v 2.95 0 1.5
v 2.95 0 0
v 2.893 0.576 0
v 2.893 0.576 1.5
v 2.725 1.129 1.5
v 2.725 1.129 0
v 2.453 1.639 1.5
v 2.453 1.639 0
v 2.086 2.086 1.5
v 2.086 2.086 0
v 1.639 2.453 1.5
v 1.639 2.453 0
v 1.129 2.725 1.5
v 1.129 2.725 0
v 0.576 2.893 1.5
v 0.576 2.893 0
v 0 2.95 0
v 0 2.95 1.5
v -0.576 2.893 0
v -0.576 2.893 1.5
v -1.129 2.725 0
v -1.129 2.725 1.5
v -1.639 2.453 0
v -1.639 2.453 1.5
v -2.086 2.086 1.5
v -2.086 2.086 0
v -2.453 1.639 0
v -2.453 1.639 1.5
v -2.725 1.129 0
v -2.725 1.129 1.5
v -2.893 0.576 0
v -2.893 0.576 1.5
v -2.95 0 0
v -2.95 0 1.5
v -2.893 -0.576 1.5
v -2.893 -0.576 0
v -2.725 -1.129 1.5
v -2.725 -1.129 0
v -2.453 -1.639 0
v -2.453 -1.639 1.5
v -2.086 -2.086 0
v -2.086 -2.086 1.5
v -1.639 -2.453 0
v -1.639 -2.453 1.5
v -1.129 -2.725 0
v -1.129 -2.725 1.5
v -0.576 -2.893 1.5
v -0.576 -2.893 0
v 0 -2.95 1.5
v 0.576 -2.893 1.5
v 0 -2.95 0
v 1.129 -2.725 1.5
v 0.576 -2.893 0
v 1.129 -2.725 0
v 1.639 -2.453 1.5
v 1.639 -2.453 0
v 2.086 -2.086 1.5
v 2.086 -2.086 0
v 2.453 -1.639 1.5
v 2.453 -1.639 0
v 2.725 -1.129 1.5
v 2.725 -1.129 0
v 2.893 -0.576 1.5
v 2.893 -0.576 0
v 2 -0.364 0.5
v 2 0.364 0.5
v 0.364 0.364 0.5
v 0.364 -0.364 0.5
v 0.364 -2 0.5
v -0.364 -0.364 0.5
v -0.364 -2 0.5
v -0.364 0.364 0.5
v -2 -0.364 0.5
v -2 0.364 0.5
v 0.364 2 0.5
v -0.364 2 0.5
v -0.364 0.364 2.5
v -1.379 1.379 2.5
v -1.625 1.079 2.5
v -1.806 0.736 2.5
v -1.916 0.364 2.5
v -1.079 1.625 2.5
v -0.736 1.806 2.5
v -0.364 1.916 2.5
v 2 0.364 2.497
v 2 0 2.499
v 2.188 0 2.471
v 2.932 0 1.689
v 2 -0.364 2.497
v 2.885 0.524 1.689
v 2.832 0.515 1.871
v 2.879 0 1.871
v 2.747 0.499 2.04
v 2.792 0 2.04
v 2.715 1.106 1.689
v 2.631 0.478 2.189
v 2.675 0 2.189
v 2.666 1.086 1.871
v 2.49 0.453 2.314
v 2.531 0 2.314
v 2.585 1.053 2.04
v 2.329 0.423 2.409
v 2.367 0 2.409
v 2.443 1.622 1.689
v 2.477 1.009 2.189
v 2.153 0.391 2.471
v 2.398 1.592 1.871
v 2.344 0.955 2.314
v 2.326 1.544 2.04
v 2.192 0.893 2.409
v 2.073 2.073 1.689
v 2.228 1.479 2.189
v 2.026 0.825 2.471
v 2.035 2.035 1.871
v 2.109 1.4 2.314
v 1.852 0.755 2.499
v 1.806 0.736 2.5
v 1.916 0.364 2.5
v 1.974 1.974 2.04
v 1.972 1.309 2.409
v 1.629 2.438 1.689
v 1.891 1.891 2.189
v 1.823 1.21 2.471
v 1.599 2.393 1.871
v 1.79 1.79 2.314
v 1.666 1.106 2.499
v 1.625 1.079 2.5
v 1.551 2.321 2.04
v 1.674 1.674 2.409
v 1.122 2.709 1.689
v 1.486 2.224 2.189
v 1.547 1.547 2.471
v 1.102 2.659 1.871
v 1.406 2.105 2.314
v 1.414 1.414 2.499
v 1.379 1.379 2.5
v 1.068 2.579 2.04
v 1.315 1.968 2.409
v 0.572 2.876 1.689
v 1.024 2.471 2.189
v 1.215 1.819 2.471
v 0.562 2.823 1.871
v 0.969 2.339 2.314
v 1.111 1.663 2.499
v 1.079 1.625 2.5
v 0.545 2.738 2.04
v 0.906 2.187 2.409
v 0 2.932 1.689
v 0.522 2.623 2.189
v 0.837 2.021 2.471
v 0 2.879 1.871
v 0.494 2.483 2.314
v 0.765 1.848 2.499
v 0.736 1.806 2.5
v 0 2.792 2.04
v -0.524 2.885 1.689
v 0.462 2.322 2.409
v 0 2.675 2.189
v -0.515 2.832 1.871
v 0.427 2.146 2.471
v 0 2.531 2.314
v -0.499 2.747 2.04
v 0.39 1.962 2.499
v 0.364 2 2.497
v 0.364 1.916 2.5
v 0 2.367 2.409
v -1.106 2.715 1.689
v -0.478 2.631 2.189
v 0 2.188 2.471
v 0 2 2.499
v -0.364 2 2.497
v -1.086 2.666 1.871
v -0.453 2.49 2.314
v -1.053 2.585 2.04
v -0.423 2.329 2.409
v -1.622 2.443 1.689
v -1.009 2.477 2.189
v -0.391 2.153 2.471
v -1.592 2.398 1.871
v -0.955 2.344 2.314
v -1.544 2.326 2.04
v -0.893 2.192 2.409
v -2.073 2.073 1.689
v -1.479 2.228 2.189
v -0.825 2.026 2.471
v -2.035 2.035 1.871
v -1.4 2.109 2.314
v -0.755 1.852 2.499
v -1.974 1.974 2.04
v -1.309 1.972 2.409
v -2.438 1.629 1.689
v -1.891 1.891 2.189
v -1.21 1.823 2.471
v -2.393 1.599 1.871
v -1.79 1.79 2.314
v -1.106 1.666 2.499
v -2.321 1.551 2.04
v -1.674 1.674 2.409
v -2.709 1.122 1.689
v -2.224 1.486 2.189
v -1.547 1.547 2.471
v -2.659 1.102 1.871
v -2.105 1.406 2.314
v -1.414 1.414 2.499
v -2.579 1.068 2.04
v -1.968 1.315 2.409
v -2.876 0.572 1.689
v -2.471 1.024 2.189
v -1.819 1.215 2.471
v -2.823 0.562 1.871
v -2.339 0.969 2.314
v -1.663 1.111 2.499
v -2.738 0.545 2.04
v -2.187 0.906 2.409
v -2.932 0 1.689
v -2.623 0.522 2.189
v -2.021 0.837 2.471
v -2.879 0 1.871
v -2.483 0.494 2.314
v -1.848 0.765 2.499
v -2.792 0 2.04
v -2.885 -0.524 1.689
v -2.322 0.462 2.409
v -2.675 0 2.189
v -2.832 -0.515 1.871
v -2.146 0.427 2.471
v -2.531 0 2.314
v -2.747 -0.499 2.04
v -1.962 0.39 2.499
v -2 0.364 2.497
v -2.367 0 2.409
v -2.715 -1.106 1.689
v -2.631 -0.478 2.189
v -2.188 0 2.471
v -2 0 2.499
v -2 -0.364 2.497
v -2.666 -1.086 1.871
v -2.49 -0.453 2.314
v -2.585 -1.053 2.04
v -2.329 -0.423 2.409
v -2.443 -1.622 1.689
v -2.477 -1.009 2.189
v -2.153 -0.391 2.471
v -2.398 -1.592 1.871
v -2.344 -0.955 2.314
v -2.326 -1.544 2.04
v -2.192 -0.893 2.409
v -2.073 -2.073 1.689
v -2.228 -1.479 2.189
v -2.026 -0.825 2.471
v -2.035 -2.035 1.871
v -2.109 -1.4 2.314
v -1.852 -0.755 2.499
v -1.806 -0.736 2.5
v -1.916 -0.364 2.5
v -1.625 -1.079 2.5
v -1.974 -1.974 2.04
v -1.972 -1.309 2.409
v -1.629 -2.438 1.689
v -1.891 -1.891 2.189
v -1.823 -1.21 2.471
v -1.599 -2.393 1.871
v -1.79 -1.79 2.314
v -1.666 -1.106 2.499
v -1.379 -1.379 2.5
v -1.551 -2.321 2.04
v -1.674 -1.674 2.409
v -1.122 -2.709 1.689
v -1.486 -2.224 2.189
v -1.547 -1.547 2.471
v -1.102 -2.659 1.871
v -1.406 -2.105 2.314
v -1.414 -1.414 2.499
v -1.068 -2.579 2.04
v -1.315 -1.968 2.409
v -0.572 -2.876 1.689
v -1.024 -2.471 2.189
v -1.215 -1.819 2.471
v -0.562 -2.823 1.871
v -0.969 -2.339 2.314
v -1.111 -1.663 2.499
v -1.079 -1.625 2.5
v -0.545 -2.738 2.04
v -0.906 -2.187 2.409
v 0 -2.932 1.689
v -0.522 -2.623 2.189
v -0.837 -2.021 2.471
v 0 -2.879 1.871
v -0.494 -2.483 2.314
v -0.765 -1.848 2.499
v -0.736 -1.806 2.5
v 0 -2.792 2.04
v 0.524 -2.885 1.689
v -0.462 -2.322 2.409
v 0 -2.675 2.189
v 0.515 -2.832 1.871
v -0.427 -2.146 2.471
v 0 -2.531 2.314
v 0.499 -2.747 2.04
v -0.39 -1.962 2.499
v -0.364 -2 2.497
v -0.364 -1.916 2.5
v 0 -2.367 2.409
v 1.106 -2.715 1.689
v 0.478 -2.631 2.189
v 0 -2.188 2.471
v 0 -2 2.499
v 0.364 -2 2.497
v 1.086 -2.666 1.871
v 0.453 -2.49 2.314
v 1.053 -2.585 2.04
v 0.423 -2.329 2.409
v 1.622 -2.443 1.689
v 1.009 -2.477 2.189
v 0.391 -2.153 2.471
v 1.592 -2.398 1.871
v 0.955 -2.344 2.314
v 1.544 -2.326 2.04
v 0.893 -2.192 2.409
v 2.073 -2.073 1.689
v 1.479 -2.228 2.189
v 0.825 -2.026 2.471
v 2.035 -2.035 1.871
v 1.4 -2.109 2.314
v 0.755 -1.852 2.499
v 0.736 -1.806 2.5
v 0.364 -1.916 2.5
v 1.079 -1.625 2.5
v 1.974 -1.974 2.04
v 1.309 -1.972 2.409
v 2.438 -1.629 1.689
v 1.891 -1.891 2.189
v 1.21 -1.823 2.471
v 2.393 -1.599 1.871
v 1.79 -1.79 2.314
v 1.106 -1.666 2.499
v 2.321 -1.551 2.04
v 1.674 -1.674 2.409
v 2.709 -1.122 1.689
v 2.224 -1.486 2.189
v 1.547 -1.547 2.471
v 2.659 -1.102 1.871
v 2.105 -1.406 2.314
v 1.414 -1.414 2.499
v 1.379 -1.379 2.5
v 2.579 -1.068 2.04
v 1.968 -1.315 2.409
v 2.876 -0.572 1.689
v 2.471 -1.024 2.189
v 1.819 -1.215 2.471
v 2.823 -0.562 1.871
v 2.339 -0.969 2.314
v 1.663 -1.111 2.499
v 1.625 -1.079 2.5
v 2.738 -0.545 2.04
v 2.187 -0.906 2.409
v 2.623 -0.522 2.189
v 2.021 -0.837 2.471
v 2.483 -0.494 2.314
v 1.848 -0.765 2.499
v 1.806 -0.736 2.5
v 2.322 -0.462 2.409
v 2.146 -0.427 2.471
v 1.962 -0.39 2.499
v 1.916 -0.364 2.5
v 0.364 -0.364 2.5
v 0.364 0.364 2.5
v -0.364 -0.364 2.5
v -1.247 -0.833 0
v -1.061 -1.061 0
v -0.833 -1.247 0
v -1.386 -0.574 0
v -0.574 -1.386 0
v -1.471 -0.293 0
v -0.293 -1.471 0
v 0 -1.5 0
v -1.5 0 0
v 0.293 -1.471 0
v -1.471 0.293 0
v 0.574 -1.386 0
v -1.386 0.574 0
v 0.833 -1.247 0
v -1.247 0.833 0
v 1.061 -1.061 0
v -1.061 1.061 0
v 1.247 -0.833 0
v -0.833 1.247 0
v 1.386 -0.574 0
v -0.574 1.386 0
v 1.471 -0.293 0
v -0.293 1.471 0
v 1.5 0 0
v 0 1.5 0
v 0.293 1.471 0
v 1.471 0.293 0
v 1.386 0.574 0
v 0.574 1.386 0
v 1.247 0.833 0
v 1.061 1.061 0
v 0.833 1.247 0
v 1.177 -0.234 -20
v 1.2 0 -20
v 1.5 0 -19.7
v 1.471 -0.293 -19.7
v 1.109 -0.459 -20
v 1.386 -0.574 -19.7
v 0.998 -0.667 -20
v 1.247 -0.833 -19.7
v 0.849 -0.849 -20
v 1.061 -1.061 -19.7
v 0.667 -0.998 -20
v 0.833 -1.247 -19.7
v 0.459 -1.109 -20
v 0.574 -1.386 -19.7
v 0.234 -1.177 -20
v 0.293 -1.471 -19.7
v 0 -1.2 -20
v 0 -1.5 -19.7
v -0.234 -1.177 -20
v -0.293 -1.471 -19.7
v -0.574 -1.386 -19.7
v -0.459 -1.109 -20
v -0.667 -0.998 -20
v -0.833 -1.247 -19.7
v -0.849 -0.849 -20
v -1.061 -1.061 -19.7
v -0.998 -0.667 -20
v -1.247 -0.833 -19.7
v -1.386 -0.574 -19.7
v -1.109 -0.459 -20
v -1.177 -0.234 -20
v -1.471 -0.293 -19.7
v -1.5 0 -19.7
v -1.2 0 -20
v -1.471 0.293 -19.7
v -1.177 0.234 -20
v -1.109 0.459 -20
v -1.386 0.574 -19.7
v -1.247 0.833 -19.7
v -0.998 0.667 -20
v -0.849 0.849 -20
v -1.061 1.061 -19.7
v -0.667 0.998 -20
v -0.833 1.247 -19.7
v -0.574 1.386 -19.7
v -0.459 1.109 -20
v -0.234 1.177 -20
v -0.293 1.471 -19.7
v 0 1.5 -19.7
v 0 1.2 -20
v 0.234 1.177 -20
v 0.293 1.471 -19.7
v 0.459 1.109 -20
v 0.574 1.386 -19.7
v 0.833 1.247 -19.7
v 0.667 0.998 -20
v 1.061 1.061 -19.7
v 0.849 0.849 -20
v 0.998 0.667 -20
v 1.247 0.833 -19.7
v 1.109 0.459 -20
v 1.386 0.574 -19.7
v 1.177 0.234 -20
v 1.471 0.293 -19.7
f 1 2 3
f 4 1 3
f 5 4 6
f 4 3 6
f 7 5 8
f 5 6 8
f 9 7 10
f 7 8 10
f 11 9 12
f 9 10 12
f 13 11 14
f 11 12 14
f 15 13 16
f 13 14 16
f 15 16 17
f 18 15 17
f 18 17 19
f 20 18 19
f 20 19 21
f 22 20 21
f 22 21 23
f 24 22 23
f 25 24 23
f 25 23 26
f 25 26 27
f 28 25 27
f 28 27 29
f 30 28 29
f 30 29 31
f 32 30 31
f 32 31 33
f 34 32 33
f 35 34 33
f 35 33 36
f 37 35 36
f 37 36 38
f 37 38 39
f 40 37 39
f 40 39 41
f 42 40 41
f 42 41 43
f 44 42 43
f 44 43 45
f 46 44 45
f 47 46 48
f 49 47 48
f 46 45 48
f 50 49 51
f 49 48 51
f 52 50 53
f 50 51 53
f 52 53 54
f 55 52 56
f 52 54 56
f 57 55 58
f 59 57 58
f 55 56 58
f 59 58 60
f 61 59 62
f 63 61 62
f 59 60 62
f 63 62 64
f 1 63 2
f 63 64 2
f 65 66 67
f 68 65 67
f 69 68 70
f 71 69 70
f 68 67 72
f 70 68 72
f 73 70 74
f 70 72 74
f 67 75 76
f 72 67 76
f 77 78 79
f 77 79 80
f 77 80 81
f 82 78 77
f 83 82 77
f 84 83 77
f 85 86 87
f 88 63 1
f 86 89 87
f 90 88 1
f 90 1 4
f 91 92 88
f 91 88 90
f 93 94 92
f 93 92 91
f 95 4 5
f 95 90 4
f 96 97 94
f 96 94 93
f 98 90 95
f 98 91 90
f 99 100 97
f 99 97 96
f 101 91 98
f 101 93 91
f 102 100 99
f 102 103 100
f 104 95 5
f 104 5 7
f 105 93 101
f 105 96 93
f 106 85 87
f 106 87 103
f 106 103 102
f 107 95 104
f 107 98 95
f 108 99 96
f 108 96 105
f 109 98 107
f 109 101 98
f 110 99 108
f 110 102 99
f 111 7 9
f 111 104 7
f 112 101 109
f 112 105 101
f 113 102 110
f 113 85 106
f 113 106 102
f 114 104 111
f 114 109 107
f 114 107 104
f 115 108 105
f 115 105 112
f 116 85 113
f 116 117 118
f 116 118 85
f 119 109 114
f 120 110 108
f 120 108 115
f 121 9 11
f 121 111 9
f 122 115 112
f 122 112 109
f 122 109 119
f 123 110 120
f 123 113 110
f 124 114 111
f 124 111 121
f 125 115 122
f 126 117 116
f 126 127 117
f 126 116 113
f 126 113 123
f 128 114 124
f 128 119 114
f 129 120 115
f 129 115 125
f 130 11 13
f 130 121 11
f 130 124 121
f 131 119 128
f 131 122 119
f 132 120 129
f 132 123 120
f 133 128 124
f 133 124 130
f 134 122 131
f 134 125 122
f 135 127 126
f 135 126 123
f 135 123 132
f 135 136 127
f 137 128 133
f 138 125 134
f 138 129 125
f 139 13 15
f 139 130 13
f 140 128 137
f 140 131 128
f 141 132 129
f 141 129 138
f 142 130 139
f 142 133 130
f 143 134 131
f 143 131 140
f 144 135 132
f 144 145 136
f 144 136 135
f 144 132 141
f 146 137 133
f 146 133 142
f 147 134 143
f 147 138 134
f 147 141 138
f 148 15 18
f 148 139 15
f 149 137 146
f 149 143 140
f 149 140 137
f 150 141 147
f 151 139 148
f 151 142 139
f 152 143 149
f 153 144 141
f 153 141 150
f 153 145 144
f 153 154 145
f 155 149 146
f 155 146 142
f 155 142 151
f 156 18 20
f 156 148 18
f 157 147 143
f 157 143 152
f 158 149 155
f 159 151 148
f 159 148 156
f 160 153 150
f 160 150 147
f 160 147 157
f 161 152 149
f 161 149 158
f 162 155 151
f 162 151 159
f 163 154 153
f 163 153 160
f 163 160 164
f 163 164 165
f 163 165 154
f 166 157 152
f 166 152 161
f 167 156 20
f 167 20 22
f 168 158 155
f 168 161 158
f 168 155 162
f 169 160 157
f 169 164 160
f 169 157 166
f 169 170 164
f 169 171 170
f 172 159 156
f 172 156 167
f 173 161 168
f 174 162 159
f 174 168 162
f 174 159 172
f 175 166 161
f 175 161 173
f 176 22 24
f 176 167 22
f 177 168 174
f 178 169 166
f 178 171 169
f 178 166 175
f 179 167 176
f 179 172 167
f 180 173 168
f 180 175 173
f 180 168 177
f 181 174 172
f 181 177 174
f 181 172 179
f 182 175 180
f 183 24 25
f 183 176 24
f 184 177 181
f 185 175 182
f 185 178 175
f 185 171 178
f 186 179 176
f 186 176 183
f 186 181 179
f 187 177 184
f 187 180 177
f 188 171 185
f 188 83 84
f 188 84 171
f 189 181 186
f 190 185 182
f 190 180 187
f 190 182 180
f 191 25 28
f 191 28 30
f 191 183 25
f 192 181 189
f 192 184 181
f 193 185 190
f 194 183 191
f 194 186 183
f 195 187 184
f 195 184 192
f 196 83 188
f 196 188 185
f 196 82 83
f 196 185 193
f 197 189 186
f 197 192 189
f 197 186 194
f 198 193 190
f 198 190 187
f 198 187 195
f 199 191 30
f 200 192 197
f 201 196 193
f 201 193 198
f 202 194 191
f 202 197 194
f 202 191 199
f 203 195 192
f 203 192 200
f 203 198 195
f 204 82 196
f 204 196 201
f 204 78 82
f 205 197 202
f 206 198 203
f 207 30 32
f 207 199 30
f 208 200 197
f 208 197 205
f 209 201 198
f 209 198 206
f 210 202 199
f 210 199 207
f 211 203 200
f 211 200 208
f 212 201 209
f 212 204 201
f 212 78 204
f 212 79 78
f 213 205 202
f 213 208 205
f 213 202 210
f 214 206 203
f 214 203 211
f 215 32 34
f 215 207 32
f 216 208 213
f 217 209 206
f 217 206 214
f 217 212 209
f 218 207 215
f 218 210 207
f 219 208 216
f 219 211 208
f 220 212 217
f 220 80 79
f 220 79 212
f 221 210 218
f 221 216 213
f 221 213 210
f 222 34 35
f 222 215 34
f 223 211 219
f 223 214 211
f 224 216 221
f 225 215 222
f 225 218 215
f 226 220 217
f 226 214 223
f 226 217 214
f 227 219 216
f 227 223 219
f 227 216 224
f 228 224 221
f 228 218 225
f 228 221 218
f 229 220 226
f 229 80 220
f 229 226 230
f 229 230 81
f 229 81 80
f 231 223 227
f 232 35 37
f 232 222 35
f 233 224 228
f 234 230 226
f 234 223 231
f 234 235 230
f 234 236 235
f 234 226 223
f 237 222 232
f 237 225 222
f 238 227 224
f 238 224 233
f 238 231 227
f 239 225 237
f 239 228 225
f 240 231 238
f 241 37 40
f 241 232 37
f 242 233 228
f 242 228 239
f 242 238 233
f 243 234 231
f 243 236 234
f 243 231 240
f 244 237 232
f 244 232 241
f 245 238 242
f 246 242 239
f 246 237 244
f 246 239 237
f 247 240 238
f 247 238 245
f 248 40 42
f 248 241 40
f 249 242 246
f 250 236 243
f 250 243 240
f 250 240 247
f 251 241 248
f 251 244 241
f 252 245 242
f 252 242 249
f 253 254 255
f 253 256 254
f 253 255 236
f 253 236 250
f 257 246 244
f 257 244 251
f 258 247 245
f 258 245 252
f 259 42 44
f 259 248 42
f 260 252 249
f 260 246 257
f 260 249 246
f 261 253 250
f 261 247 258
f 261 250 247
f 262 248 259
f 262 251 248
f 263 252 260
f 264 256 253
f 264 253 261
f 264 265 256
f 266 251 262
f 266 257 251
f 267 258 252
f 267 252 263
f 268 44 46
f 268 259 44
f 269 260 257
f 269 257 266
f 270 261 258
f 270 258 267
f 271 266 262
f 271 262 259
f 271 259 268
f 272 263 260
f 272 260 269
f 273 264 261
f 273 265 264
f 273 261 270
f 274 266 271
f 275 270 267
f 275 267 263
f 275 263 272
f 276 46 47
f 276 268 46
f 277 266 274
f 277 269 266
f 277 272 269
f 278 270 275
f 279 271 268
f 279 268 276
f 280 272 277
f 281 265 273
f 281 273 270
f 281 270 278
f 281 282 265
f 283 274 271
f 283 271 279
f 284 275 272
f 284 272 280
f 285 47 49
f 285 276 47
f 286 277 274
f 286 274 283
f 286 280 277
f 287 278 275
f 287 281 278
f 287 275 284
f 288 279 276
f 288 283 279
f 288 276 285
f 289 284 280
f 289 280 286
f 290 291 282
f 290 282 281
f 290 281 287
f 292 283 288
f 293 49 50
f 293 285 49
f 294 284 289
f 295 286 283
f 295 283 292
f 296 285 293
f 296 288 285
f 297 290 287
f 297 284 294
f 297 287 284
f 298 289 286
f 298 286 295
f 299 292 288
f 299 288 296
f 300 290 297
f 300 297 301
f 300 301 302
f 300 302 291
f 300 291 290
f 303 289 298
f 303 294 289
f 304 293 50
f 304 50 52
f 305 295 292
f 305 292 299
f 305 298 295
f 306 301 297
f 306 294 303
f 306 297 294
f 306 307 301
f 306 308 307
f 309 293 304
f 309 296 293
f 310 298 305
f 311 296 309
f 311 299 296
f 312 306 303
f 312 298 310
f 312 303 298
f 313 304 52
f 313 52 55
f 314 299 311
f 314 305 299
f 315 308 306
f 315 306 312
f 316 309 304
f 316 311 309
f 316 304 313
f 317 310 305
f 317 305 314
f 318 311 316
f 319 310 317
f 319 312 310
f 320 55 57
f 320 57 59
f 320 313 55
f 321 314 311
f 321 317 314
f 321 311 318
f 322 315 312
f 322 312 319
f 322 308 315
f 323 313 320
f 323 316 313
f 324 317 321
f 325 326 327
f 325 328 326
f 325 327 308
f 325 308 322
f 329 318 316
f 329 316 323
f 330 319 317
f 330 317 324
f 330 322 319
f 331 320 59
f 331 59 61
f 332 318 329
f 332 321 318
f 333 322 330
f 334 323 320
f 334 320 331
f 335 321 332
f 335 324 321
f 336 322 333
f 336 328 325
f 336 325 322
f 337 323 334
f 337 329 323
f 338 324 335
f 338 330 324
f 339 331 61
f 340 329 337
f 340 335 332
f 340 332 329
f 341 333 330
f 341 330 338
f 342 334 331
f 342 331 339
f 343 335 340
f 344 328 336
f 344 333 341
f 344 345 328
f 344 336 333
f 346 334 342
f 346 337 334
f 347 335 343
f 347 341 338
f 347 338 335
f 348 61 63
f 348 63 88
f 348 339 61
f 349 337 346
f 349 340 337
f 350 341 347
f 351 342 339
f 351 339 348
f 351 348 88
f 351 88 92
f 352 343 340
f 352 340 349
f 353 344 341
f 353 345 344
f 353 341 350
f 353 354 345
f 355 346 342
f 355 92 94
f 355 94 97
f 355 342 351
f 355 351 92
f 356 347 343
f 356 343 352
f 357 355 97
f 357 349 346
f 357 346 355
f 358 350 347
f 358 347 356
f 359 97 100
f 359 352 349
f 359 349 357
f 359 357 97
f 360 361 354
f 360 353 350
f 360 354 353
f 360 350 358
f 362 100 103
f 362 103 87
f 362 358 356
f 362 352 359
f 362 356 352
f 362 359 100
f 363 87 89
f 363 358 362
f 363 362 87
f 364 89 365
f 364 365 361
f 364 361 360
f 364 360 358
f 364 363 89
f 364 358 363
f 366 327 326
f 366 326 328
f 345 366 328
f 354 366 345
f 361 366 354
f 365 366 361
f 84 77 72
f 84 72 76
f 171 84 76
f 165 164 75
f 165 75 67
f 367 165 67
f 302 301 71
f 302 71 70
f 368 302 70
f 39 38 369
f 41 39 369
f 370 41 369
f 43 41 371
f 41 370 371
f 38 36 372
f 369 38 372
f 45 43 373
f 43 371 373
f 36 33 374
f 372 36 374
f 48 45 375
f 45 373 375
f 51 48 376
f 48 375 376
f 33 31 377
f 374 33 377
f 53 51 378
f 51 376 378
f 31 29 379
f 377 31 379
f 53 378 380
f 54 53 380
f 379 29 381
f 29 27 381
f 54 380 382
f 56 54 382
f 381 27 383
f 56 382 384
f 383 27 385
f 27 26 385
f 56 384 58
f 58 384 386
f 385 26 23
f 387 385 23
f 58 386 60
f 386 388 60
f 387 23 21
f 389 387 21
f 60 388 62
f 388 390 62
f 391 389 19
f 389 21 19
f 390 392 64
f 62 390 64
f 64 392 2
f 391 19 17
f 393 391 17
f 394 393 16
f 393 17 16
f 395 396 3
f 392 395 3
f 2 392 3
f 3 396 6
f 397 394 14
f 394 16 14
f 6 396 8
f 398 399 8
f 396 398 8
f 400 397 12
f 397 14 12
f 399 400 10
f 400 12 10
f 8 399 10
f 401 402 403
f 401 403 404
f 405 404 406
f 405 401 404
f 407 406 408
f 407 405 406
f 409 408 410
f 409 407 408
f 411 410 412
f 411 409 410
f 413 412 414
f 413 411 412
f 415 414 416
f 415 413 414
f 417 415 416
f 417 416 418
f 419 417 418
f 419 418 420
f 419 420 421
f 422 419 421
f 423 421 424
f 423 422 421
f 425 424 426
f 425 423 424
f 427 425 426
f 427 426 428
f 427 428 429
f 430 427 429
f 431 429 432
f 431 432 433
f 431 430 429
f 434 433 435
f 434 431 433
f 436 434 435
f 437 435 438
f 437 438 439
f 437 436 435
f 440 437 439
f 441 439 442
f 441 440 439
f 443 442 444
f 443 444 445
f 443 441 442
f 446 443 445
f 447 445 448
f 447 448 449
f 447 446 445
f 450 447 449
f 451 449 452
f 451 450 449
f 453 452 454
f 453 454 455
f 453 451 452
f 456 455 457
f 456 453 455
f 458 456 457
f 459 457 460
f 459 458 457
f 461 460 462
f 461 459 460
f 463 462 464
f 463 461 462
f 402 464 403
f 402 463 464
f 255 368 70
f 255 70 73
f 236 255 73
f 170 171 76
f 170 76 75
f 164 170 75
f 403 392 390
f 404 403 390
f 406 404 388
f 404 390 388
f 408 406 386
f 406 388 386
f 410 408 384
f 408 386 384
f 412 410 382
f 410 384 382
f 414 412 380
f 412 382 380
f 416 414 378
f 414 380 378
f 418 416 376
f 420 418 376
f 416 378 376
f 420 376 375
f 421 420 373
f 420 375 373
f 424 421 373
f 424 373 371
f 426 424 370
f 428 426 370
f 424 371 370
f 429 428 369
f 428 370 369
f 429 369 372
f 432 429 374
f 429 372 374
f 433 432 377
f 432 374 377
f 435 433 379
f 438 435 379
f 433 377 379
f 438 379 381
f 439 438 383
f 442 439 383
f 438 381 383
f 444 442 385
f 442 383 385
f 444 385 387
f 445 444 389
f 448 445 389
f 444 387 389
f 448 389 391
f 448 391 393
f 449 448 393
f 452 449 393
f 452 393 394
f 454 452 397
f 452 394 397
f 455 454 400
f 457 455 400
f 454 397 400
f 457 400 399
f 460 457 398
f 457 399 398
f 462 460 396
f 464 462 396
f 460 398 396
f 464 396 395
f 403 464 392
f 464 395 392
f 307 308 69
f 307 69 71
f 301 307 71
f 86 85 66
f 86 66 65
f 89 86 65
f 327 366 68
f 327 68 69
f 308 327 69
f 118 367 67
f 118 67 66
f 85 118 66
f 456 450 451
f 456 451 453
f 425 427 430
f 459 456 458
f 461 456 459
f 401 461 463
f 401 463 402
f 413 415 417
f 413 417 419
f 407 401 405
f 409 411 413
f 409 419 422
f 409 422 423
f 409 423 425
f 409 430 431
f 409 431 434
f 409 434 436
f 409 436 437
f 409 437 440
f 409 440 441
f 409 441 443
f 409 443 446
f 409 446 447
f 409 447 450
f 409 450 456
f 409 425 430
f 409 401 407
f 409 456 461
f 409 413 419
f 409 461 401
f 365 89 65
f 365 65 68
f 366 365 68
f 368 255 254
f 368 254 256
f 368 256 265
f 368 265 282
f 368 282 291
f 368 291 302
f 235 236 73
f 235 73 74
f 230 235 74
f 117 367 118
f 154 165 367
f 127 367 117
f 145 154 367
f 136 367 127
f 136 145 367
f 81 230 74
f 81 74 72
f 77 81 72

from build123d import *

# Parameters (mm, degrees)
SKETCH1_R           = 2.95
BOSS_EXTRUDE1_DEPTH = 2.5
SKETCH2_R           = 1.5
BOSS_EXTRUDE2_DEPTH = 20
CHAMFER1_SIZE       = 0.3
CUT_EXTRUDE1_DEPTH  = 2
FILLET1_R           = 1


with BuildPart() as part:
    # Sketch1 → Boss-Extrude1 (new body)
    with BuildSketch(Plane.XY):
        Circle(SKETCH1_R)
    extrude(amount=BOSS_EXTRUDE1_DEPTH)

    # Sketch2 → Boss-Extrude2 (add)
    with BuildSketch(Plane(origin=(0, 0, 0), x_dir=(-1, 0, 0), z_dir=(0, 0, -1))):
        with Locations(Location((0, 0, 0), (0, 0, 180))):
            Circle(SKETCH2_R)
    extrude(amount=BOSS_EXTRUDE2_DEPTH)

    # Chamfer1
    chamfer1_edges = [part.edges().sort_by_distance(p)[0] for p in [
        (-1.5, 0, -20),
    ]]
    chamfer(chamfer1_edges, length=CHAMFER1_SIZE)

    # Sketch3 → Cut-Extrude1 (cut)
    with BuildSketch(Plane.XY.offset(2.5)):
        Polygon((0.363589324, 0.363589324), (2, 0.363589324), (2, -0.363589324), (0.363589324, -0.363589324), (0.363589324, -2), (-0.363589324, -2), (-0.363589324, -0.363589324), (-2, -0.363589324), (-2, 0.363589324), (-0.363589324, 0.363589324), (-0.363589324, 2), (0.363589324, 2), align=None)
    extrude(amount=-CUT_EXTRUDE1_DEPTH, mode=Mode.SUBTRACT)

    # Fillet1
    # the kernel refuses this fillet: 1 mm, written as the material it takes off along each edge
    with BuildSketch(Plane(origin=(0, 0, 2.5), x_dir=(1, 0, 0), z_dir=(0, -1, 0))) as fillet1_piece_1:
        with BuildLine():
            CenterArc((2.95 - FILLET1_R, -FILLET1_R), FILLET1_R, 0, 90)
            Line((2.95 - FILLET1_R, 0), (2.95, 0))
            Line((2.95, 0), (2.95, -FILLET1_R))
        make_face()
    revolve(axis=Axis((0, 0, 2.5), (0, 0, 1)), mode=Mode.SUBTRACT)


solid = part.part
